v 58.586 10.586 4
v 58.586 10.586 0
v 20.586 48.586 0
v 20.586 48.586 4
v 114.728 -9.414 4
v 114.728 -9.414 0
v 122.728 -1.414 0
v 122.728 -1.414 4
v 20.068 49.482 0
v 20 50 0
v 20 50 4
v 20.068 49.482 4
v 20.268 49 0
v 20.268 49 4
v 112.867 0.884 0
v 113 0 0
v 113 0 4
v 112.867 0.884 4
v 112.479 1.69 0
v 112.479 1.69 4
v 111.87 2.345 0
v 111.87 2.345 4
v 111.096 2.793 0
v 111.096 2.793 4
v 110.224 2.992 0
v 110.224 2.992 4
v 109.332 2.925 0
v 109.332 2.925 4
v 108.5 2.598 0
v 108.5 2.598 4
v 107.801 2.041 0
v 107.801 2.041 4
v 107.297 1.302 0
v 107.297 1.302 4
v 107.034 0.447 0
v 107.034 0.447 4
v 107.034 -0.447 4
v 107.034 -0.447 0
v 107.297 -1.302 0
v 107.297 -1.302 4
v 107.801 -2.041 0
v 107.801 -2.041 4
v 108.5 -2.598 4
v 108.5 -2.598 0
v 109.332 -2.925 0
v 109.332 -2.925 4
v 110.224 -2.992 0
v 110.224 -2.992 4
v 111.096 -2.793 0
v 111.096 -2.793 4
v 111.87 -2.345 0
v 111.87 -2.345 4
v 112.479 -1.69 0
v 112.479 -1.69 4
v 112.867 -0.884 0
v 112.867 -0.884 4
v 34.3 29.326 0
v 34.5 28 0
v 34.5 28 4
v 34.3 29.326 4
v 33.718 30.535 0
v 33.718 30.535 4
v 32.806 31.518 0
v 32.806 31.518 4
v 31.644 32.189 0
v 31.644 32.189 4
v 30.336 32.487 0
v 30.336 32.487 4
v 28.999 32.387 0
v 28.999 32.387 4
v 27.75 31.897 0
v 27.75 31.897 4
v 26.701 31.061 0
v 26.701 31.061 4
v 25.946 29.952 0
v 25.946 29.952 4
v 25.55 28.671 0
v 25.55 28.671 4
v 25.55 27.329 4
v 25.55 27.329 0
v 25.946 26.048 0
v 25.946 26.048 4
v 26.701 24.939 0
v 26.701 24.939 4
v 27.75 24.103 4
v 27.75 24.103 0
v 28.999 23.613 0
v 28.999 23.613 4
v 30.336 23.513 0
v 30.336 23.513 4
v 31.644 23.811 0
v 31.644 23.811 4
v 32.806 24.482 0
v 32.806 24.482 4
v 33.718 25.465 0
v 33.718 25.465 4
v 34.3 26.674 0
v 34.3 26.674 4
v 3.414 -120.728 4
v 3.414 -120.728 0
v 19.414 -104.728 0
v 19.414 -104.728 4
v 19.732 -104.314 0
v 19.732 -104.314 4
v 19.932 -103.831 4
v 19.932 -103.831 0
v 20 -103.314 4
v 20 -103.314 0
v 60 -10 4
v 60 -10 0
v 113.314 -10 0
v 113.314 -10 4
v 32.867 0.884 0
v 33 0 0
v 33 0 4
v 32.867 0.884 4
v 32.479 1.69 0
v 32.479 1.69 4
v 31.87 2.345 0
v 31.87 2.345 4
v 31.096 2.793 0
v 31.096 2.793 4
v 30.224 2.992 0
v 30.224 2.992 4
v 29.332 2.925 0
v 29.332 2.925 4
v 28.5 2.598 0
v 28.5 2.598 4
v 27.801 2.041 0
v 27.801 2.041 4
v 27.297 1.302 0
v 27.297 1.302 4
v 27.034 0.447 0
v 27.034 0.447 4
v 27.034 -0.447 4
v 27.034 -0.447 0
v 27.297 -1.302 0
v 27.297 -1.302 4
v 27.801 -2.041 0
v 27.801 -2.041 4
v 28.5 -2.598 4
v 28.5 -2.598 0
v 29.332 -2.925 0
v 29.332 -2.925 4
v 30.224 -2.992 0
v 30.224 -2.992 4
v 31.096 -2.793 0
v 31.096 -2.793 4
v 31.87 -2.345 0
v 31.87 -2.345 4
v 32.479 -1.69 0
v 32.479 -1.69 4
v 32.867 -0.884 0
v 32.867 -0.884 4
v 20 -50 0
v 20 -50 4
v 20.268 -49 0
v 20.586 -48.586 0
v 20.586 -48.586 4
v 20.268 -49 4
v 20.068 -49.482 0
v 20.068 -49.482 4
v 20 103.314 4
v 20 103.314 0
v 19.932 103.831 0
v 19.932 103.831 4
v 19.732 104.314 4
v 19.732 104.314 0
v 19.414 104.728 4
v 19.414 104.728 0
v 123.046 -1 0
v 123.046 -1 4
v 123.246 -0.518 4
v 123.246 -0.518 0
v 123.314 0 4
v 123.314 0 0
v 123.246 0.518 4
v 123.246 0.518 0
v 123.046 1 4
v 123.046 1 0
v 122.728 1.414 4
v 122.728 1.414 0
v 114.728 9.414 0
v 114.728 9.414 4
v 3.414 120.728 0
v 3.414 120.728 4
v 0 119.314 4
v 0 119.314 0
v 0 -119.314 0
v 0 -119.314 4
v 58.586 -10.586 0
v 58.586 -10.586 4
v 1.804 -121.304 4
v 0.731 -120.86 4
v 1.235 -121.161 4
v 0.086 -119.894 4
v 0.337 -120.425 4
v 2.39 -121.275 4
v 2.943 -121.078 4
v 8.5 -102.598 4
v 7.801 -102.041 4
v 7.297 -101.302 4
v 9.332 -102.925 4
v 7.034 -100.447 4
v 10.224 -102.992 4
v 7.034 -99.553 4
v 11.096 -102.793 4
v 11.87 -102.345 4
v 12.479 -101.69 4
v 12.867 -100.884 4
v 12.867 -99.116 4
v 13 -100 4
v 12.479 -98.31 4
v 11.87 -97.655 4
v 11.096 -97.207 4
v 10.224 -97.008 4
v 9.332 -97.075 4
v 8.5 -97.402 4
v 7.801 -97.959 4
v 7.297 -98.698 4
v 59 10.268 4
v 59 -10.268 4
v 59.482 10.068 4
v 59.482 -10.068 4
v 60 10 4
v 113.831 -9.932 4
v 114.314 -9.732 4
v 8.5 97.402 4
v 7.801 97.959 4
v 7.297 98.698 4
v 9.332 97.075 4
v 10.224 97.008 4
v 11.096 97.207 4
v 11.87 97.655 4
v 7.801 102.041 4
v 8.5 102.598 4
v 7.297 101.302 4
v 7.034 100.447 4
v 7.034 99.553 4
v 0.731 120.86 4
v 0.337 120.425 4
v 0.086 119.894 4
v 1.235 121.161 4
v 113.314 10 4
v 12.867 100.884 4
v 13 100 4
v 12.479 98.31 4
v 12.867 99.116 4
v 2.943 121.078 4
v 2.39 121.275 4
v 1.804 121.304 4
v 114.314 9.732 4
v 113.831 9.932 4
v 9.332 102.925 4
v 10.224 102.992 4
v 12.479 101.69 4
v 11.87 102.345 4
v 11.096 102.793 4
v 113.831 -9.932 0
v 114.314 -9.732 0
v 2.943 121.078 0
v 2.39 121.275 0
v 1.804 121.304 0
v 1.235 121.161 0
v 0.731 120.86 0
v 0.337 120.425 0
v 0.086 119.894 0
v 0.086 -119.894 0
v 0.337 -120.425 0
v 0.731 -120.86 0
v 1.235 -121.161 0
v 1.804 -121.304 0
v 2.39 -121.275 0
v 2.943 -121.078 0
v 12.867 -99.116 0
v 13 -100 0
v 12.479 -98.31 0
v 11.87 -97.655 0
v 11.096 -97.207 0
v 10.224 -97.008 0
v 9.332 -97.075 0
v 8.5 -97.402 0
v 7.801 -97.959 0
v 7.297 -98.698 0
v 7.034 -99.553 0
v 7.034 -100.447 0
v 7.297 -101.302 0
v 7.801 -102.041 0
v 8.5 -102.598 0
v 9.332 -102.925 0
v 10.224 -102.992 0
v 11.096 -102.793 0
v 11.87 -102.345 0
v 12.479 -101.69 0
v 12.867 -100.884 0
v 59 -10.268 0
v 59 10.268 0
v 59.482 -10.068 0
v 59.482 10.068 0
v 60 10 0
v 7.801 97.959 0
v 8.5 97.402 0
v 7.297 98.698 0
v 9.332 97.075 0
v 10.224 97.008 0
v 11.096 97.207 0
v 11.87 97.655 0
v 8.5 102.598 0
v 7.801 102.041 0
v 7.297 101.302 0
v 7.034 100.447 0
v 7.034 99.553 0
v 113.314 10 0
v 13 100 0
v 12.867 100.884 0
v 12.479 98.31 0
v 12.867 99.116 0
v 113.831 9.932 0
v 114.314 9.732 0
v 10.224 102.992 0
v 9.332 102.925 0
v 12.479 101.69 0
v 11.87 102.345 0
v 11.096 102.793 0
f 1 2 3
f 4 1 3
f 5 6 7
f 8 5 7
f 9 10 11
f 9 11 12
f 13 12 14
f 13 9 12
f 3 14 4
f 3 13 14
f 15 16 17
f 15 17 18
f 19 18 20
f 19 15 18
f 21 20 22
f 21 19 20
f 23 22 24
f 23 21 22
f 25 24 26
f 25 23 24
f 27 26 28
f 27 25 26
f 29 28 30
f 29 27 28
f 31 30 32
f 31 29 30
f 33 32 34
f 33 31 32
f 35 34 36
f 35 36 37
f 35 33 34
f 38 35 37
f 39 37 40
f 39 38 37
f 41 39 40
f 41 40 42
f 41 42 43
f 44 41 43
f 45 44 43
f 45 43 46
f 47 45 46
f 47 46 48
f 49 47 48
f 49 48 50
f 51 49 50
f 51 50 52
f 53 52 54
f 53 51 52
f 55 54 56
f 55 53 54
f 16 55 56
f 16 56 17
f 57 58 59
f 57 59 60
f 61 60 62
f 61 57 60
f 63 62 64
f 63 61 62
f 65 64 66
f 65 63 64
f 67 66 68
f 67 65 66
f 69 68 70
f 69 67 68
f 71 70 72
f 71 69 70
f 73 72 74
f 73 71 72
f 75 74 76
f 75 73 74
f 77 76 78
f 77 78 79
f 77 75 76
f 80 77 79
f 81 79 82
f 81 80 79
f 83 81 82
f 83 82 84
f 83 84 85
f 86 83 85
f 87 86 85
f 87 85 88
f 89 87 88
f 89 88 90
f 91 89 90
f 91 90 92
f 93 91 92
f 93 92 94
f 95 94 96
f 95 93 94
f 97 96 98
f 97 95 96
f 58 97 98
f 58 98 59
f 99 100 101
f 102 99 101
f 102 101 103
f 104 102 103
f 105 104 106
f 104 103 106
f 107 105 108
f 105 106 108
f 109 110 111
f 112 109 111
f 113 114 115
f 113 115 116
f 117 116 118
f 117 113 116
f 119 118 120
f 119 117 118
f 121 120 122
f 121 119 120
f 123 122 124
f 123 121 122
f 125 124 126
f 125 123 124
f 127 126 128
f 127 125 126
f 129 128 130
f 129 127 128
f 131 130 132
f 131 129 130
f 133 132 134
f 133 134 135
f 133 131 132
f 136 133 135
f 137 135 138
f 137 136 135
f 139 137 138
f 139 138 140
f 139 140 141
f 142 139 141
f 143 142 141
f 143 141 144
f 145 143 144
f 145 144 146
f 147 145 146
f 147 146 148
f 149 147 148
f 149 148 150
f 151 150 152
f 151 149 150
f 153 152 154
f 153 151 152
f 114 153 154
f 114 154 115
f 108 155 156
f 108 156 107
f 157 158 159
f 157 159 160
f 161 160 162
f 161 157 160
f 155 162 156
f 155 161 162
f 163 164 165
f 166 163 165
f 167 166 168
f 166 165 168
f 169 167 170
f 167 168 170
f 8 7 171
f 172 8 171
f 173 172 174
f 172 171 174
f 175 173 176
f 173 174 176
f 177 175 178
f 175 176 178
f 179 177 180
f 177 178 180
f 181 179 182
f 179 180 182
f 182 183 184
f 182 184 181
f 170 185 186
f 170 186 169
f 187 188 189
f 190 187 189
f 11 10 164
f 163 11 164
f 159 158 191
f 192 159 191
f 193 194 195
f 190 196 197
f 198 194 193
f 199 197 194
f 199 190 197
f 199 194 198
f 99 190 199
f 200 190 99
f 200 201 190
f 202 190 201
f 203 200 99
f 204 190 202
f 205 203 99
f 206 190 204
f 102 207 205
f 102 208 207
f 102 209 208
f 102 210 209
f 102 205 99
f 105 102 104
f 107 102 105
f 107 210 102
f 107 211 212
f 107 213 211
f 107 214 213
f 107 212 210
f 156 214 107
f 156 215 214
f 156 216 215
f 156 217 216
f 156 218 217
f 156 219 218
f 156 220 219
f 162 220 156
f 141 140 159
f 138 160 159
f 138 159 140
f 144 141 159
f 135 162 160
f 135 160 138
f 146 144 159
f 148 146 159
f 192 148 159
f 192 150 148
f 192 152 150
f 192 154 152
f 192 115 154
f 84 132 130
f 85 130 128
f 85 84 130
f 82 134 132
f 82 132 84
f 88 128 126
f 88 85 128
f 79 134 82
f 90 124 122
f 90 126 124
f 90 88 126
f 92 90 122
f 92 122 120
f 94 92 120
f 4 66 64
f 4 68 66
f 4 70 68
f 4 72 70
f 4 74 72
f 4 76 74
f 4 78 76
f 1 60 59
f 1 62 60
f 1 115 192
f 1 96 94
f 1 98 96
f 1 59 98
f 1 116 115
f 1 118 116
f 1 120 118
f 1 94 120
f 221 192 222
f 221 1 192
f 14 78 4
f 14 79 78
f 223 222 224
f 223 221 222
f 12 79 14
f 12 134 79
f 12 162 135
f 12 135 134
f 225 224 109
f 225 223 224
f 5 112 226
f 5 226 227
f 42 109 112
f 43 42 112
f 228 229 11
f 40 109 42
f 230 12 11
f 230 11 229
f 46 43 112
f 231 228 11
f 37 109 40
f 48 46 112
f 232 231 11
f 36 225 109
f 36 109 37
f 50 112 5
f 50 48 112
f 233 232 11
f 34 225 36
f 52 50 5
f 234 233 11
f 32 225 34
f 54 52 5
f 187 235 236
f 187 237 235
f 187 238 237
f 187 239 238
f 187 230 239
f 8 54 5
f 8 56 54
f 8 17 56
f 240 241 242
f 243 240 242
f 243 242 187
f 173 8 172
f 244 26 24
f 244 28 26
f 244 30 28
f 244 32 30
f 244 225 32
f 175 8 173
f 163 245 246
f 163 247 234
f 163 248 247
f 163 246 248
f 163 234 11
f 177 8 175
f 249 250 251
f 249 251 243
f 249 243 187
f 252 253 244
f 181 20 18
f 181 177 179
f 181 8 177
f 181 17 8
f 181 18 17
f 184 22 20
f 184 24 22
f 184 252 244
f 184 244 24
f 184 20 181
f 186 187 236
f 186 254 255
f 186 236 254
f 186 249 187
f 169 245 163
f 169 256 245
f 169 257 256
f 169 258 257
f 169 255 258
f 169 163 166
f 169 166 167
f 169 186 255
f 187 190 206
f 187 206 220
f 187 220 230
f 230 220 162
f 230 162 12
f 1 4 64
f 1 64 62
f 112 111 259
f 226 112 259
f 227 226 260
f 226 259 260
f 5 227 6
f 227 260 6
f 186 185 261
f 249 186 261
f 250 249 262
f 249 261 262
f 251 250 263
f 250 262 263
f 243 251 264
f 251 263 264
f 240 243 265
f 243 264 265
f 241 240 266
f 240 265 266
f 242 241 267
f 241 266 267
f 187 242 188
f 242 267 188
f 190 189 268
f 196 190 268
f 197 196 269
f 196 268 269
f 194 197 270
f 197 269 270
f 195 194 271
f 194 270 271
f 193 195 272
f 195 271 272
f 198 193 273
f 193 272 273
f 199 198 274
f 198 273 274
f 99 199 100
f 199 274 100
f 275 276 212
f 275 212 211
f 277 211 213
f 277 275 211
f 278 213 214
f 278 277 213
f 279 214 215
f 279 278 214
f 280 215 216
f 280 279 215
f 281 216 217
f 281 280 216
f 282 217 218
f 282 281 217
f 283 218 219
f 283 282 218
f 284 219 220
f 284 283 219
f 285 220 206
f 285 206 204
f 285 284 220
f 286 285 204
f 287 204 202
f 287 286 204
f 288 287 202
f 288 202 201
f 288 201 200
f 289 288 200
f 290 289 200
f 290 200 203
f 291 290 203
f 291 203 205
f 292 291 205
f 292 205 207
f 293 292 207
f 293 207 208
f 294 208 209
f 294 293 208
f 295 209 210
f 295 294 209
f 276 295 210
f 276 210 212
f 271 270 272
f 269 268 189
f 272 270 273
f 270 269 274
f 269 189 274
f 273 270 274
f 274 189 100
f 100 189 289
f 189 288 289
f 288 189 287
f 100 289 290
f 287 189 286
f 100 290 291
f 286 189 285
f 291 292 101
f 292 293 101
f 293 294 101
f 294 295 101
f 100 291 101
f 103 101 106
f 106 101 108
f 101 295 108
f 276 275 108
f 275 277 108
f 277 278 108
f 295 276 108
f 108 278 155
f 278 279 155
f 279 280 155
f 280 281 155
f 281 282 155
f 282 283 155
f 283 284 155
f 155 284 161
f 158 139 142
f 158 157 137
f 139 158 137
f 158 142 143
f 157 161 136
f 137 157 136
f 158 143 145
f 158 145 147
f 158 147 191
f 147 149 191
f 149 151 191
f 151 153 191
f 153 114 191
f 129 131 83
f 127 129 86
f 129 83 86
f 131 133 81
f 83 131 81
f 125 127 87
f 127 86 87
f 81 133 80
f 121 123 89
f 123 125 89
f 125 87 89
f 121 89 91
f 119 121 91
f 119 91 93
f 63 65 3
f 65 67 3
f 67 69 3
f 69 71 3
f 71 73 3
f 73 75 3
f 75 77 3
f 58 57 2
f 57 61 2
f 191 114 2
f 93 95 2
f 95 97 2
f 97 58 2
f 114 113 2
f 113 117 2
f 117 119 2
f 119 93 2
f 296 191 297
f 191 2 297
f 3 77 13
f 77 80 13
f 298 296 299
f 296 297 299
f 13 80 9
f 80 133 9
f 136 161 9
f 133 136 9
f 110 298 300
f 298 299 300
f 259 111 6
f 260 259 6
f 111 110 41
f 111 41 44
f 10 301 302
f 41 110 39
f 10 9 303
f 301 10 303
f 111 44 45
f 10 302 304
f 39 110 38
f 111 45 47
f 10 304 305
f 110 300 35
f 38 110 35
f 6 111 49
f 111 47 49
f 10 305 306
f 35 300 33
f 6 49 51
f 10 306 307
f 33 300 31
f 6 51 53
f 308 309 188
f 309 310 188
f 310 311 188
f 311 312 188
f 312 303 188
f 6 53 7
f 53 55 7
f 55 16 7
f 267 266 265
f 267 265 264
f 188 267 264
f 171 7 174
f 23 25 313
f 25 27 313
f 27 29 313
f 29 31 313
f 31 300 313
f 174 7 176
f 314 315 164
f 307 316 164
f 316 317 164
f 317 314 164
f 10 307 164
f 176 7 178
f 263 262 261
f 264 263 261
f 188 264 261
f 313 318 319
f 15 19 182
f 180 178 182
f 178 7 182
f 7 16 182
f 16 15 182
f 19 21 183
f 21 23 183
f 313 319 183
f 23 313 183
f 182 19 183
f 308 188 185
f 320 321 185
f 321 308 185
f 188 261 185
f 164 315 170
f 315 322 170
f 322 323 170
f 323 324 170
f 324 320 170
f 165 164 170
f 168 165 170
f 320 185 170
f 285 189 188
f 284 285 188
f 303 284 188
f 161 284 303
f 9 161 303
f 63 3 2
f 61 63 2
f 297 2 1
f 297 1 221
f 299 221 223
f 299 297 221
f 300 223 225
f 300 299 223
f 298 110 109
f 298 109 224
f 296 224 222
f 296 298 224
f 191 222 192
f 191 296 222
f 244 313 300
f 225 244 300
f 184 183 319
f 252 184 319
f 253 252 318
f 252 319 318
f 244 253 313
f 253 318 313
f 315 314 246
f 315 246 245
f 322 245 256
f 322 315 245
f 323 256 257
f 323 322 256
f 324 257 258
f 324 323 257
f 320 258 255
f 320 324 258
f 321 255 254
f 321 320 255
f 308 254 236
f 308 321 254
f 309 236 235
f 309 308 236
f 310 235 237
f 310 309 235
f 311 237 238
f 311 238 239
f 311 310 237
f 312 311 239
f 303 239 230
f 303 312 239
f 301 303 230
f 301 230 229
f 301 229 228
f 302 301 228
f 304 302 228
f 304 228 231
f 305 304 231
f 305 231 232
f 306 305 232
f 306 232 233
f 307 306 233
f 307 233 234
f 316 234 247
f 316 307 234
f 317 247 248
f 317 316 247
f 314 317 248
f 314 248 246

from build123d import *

# Parameters (mm, degrees)
SKETCH_R   = 3
SKETCH_R_2 = 4.5
PAD_DEPTH  = 4


with BuildPart() as part:
    # Sketch → Pad (new body)
    with BuildSketch(Plane.XY):
        with BuildLine():
            Line((0, 119.313708), (0, -119.313708))
            ThreePointArc((0, -119.313708), (1.234633, -121.161468), (3.414214, -120.727922))
            Line((3.414214, -120.727922), (19.414214, -104.727922))
            ThreePointArc((19.414214, -104.727922), (19.847759, -104.079075), (20, -103.313708))
            Line((20, -50), (20, -103.313708))
            ThreePointArc((20.585786, -48.585786), (20.152241, -49.234633), (20, -50))
            Line((20.585786, -48.585786), (58.585786, -10.585786))
            ThreePointArc((60, -10), (59.234633, -10.152241), (58.585786, -10.585786))
            Line((60, -10), (113.313708, -10))
            ThreePointArc((113.313708, -10), (114.079075, -9.847759), (114.727922, -9.414214))
            Line((114.727922, -9.414214), (122.727922, -1.414214))
            ThreePointArc((122.727922, -1.414214), (123.313708, 0), (122.727922, 1.414214))
            Line((114.727922, 9.414214), (122.727922, 1.414214))
            ThreePointArc((114.727922, 9.414214), (114.079075, 9.847759), (113.313708, 10))
            Line((113.313708, 10), (60, 10))
            ThreePointArc((58.585786, 10.585786), (59.234633, 10.152241), (60, 10))
            Line((58.585786, 10.585786), (20.585786, 48.585786))
            ThreePointArc((20, 50), (20.152241, 49.234633), (20.585786, 48.585786))
            Line((20, 50), (20, 103.313708))
            ThreePointArc((20, 103.313708), (19.847759, 104.079075), (19.414214, 104.727922))
            Line((3.414214, 120.727922), (19.414214, 104.727922))
            ThreePointArc((3.414214, 120.727922), (1.234633, 121.161468), (0, 119.313708))
        make_face()
        with Locations((10, -100)):
            Circle(SKETCH_R, mode=Mode.SUBTRACT)
        with Locations((10, 100)):
            Circle(SKETCH_R, mode=Mode.SUBTRACT)
        with Locations((110, 0)):
            Circle(SKETCH_R, mode=Mode.SUBTRACT)
        with Locations((30, 0)):
            Circle(SKETCH_R, mode=Mode.SUBTRACT)
        with Locations((30, 28)):
            Circle(SKETCH_R_2, mode=Mode.SUBTRACT)
    extrude(amount=PAD_DEPTH)


solid = part.part
